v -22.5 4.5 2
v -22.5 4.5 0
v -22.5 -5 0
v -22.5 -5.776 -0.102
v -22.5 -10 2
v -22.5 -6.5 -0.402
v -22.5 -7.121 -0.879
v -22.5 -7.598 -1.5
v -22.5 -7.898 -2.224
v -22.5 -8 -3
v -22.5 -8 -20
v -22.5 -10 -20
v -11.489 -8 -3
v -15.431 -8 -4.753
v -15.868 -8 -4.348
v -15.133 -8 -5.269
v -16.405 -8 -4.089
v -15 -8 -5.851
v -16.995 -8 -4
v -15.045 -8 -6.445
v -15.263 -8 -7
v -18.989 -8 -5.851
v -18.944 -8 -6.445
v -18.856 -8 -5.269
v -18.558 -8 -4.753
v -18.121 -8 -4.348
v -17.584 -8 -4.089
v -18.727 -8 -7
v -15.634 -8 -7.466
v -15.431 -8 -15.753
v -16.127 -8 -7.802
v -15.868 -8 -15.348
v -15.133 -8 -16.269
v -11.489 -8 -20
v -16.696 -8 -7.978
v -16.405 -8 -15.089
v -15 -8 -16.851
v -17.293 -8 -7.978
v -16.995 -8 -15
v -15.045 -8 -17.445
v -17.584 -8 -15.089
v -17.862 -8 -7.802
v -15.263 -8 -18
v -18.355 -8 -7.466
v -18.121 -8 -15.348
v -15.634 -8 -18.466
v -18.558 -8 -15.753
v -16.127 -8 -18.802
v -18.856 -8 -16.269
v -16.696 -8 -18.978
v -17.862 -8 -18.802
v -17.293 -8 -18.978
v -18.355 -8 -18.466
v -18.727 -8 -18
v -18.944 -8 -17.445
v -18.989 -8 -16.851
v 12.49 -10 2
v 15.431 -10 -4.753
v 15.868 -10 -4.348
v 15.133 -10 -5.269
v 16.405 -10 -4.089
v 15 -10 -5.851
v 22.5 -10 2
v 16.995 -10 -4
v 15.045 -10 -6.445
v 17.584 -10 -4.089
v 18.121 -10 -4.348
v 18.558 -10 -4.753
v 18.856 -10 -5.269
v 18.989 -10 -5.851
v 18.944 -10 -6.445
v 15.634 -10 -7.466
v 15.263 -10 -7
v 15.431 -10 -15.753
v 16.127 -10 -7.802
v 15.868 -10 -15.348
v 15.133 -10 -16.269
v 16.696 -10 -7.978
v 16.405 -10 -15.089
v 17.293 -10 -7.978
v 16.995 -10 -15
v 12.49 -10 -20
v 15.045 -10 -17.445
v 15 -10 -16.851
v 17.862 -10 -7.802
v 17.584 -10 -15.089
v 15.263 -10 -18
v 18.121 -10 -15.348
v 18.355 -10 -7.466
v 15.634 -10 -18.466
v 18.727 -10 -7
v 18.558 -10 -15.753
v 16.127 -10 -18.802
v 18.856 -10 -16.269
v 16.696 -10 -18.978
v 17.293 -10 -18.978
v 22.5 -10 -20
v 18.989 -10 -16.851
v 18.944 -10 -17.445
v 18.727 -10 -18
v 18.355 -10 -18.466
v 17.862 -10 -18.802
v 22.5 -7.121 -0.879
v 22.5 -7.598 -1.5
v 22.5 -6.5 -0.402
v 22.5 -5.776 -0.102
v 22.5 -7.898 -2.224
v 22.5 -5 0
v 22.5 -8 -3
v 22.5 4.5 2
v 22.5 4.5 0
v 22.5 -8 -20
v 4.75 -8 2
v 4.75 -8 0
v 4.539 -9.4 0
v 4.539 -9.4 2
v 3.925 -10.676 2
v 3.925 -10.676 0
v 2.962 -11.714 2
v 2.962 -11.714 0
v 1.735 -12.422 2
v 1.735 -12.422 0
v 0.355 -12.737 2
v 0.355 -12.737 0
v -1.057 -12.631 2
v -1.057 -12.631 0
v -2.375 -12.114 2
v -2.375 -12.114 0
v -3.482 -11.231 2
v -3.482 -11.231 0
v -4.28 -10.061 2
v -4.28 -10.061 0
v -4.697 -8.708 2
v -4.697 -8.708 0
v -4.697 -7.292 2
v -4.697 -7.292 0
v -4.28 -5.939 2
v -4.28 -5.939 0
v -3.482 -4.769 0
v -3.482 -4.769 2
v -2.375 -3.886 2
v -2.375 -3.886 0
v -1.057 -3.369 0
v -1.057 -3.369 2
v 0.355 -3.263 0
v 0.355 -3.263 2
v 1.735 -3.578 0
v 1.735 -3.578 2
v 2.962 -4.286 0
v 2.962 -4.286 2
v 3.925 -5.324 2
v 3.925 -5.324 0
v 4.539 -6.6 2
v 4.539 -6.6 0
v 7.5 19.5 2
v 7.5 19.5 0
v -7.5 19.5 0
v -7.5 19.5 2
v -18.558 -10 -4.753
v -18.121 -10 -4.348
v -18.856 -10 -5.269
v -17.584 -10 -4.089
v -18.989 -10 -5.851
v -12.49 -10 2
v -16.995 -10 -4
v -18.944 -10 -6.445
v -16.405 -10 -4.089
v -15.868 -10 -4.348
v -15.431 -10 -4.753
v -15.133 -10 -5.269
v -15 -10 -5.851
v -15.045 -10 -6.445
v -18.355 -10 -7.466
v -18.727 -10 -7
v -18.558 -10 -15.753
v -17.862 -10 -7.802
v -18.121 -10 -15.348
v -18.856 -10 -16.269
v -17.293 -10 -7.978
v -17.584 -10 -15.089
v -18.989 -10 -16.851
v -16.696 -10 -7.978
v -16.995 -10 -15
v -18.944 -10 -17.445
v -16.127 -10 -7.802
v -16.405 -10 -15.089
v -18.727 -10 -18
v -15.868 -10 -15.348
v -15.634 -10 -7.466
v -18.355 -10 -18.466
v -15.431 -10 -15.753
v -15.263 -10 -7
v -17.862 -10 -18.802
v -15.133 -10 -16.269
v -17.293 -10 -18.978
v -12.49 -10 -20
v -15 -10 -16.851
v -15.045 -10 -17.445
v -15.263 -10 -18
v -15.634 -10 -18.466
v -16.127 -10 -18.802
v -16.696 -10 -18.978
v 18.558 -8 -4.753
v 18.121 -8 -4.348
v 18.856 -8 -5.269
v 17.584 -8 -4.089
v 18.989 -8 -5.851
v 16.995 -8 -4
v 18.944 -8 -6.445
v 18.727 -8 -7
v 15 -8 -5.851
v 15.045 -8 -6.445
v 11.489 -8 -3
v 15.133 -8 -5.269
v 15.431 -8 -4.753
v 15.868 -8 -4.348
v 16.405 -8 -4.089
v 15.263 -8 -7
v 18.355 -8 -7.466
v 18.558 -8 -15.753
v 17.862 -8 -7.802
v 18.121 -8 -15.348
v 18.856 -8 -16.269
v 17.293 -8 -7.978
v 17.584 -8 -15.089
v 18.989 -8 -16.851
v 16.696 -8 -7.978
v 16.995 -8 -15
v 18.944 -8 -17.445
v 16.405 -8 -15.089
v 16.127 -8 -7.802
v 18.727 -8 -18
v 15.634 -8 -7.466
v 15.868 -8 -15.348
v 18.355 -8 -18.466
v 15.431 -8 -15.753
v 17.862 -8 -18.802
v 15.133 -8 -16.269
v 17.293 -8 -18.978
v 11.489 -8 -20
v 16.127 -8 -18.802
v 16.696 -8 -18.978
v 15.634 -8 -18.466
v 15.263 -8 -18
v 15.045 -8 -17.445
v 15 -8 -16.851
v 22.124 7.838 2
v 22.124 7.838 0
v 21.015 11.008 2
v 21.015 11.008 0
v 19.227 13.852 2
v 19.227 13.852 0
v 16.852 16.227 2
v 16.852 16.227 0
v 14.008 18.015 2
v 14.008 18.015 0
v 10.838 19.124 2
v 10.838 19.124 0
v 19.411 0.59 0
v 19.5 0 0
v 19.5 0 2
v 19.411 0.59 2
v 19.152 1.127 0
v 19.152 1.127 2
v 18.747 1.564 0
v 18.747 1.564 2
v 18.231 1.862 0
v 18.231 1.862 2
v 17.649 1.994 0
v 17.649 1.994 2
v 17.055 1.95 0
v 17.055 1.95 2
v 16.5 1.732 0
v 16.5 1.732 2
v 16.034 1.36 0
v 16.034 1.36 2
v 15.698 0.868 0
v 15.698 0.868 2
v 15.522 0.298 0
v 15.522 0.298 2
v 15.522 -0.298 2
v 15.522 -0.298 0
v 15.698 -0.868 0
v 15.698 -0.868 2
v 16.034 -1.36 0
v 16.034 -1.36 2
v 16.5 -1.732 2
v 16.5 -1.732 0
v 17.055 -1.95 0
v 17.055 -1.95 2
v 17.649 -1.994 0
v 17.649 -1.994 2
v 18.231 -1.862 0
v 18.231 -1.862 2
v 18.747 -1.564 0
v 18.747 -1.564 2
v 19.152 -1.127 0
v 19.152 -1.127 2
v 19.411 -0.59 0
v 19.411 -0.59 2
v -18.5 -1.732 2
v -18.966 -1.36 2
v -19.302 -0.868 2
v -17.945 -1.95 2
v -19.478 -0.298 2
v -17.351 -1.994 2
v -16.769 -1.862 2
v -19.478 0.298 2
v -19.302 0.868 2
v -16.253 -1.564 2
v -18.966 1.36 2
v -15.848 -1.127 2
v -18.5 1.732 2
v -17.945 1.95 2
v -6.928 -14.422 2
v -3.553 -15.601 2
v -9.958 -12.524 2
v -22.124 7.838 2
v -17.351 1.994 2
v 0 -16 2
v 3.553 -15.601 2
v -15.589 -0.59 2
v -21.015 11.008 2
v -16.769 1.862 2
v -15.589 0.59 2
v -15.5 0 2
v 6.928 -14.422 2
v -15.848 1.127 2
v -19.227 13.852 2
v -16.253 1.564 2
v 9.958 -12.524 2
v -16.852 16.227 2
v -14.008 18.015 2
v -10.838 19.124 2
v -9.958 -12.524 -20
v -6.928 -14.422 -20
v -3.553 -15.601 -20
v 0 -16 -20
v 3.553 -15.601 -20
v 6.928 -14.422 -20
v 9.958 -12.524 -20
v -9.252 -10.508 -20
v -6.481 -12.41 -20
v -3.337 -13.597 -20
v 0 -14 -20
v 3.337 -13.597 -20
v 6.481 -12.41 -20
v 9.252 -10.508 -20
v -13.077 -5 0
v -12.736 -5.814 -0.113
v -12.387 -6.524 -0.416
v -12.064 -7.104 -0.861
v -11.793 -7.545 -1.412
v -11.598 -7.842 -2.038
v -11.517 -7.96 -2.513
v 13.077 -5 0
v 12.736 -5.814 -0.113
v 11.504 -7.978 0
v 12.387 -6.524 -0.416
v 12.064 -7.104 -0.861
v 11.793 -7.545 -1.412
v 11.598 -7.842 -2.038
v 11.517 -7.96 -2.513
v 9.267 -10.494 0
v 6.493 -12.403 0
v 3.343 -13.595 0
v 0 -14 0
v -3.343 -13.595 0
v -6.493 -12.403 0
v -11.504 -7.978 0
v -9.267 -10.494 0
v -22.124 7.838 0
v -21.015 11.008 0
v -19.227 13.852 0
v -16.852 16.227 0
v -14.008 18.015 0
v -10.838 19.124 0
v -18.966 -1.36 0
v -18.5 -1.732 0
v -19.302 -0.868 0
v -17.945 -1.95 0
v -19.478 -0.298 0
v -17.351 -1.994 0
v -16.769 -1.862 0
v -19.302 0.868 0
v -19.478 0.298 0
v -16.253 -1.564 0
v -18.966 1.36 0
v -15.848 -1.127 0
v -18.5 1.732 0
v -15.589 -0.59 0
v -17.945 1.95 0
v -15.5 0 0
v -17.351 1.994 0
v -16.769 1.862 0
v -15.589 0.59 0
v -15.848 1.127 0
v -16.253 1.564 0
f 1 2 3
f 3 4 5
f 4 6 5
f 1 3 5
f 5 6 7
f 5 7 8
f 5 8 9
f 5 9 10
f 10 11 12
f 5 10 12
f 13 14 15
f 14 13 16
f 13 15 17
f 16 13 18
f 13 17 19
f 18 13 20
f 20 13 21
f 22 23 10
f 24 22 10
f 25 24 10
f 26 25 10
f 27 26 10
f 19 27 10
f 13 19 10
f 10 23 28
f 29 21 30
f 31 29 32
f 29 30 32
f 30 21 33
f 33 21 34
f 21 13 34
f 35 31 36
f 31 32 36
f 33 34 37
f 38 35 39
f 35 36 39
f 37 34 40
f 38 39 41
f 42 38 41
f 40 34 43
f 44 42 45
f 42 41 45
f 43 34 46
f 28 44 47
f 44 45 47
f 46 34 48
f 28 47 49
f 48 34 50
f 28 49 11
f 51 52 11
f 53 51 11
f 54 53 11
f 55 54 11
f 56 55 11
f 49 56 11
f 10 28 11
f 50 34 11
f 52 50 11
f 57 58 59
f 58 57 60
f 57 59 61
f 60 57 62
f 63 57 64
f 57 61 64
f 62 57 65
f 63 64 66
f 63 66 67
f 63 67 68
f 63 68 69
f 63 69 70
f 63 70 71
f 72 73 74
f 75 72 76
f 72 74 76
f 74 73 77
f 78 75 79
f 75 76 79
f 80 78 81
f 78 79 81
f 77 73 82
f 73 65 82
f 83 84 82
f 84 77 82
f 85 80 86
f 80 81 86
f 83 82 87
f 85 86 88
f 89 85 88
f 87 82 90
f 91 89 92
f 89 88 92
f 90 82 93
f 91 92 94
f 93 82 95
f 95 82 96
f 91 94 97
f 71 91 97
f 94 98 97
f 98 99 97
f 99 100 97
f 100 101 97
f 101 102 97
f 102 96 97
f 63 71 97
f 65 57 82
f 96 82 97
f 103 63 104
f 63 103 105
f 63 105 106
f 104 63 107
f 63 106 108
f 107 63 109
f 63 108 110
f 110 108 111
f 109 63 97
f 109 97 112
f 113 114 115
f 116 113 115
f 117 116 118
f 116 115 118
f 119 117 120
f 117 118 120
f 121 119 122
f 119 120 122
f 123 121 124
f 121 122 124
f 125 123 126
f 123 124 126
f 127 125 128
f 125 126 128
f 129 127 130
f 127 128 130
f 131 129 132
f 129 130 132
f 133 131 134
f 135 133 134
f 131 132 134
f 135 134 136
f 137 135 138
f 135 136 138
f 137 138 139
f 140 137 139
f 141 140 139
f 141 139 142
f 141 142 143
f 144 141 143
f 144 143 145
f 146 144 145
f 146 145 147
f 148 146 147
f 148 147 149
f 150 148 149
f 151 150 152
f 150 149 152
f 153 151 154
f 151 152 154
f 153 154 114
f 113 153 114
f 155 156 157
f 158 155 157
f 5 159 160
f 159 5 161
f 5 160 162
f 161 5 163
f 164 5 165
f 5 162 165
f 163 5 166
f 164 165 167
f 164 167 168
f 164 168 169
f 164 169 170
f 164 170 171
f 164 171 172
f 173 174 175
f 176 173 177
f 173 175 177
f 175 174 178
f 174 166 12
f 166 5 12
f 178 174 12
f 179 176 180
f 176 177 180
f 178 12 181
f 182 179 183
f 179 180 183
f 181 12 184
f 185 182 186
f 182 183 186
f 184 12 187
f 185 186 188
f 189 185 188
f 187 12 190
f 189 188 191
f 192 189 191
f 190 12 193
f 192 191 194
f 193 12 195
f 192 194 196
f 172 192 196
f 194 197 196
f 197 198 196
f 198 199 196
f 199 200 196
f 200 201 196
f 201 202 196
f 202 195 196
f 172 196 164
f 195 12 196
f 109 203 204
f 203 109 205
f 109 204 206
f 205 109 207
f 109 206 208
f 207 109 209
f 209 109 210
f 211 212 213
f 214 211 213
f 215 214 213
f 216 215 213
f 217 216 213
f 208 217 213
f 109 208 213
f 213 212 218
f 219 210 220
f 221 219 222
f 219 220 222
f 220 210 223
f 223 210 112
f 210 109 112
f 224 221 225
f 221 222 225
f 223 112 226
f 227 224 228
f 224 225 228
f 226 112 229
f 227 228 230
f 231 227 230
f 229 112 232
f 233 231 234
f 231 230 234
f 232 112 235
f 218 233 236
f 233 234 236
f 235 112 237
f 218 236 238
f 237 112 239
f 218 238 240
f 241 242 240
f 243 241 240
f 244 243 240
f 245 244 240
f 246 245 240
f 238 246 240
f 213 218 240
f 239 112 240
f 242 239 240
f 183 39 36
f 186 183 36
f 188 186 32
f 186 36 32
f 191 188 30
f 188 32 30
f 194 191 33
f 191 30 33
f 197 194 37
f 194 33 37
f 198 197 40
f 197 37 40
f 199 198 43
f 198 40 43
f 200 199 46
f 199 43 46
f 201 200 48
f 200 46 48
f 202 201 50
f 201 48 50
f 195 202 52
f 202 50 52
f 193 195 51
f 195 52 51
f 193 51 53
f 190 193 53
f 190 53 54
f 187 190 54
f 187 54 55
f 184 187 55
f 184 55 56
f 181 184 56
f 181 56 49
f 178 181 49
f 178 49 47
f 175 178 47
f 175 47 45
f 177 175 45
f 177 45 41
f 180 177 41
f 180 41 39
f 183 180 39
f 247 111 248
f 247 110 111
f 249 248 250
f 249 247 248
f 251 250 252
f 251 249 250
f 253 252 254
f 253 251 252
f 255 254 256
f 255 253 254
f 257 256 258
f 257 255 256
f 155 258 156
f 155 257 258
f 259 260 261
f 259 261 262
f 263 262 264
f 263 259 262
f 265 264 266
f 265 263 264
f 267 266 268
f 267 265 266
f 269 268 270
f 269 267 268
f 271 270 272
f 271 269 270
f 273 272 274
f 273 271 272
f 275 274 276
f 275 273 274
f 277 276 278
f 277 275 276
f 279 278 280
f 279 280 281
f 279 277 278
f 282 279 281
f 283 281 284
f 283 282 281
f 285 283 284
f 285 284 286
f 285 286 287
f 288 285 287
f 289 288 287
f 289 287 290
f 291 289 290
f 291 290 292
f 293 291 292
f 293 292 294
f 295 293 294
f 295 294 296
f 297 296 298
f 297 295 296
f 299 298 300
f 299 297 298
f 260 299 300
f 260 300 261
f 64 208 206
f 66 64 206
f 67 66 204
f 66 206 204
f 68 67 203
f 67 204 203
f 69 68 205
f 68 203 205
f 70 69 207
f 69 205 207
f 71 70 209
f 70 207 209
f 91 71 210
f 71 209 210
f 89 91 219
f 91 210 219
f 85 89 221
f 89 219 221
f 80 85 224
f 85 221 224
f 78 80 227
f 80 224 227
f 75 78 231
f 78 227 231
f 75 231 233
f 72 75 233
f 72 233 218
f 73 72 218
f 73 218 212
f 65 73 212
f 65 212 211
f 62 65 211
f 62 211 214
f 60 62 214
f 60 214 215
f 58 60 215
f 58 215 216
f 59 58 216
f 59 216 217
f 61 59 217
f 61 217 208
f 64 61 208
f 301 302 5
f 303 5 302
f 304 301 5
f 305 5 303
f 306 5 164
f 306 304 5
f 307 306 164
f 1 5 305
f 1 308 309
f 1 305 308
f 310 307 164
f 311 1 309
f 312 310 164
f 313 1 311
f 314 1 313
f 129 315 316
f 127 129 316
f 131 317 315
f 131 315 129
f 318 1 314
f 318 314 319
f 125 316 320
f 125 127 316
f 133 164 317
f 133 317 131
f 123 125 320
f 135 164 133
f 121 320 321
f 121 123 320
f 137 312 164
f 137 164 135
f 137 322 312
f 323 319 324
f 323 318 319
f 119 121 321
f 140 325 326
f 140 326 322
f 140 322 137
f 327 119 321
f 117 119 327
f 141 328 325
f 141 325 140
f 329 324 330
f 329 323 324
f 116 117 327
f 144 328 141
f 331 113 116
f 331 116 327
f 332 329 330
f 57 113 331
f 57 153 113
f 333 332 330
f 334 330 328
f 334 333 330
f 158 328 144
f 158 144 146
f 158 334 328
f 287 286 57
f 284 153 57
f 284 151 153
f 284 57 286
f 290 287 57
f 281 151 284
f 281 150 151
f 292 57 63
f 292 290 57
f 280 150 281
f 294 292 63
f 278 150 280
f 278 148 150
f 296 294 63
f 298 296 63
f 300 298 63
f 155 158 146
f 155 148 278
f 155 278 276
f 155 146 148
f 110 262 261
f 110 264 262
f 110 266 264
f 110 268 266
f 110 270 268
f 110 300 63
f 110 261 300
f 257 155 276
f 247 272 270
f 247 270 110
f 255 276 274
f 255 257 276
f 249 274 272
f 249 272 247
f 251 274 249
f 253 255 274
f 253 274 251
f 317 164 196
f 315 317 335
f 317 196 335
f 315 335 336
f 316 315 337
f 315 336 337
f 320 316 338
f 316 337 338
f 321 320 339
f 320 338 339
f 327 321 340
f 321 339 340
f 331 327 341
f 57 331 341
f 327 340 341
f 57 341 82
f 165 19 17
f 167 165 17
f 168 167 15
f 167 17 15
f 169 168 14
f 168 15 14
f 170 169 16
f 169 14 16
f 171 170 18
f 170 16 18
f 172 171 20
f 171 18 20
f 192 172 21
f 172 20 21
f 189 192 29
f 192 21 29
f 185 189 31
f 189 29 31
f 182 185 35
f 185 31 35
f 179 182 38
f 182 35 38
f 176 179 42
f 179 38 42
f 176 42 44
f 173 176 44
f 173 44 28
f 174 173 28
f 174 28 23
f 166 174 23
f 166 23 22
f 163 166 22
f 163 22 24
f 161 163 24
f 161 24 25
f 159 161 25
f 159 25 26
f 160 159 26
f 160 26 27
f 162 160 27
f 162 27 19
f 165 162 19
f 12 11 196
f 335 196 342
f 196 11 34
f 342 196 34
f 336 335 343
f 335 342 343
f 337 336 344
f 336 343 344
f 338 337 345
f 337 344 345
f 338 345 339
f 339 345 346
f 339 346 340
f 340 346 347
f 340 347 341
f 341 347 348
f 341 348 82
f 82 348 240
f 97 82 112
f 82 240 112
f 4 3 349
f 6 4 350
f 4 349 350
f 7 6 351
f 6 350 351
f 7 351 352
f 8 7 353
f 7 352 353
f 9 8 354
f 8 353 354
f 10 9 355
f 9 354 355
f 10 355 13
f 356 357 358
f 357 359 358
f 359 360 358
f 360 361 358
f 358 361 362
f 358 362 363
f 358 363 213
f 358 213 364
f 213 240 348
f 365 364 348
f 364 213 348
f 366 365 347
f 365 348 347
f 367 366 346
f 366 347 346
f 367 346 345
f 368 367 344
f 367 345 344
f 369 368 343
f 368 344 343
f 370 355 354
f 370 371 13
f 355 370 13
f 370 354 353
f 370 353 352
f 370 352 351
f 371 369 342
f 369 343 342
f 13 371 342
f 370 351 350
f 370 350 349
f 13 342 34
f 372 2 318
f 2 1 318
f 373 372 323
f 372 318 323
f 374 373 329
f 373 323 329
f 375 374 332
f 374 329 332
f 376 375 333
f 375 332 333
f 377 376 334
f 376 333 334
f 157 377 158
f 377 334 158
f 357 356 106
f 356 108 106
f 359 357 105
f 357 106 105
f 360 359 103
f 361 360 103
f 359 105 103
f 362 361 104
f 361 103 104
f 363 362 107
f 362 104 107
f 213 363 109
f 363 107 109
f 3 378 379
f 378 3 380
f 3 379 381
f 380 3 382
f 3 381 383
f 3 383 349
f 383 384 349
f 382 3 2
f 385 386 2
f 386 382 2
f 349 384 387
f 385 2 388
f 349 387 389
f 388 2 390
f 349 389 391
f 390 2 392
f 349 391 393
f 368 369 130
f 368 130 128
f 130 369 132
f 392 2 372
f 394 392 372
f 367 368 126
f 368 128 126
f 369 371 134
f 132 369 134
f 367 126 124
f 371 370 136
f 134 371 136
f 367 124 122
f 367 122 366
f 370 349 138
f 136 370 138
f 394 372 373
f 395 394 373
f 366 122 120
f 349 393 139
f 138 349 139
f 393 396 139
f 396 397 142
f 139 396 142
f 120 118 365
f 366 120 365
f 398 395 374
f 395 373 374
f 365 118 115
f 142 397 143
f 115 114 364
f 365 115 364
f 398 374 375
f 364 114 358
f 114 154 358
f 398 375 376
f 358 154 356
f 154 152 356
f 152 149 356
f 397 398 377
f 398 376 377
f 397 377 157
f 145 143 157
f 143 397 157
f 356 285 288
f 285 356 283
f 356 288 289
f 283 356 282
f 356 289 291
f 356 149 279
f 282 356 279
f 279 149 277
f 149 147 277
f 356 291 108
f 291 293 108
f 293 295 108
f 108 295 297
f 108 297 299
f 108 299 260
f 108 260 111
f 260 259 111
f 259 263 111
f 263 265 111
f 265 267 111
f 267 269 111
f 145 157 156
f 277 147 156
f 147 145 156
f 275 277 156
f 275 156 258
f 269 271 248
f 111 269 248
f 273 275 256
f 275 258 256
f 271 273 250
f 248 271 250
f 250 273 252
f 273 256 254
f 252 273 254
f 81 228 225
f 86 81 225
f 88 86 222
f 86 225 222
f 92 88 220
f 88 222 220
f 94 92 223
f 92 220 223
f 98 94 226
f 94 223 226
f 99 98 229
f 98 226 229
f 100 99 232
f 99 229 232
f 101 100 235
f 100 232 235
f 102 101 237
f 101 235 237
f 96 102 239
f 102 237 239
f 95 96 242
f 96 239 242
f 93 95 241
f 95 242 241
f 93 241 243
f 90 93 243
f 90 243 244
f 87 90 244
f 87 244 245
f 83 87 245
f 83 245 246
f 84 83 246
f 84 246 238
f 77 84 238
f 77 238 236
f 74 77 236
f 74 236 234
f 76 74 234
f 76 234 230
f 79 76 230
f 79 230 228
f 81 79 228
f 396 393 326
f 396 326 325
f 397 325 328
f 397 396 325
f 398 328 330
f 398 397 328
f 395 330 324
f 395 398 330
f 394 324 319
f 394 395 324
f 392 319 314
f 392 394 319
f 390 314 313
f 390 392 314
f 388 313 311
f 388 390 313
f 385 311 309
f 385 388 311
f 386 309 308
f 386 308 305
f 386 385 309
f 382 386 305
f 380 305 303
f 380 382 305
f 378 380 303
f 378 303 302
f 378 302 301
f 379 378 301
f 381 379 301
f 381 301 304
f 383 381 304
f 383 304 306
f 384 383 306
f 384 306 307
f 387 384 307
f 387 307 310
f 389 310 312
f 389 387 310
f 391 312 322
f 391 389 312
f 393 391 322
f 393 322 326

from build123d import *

# Parameters (mm, degrees)
SKETCH1_R           = 2
BOSS_EXTRUDE2_DEPTH = 2
BOSS_EXTRUDE3_START = -22
BOSS_EXTRUDE3_DEPTH = 22
FILLET1_R           = 15
FILLET2_R           = 3
SKETCH3_R           = 2
CUT_EXTRUDE1_DEPTH  = 21


with BuildPart() as part:
    # Sketch1 → Boss-Extrude2 (new body)
    # profile 1 of 5: a face of its own
    with BuildSketch(Plane.XY):
        with BuildLine():
            Line((-22.5, 19.5), (-22.5, -8))
            Line((-22.5, -8), (-11.489125293, -8))
            ThreePointArc((-11.489125293, -8), (-4.192388692, 13.357540082), (14, 0))
            ThreePointArc((14, 0), (13.357540082, -4.192388692), (11.489125293, -8))
            Line((11.489125293, -8), (22.5, -8))
            Line((22.5, -8), (22.5, 19.5))
            Line((22.5, 19.5), (-22.5, 19.5))
        make_face()
        with Locations((-17.5, 0)):
            Circle(SKETCH1_R, mode=Mode.SUBTRACT)
        with Locations((17.5, 0)):
            Circle(SKETCH1_R, mode=Mode.SUBTRACT)
    # profile 2 of 5: a face of its own
    with BuildSketch(Plane.XY):
        with BuildLine():
            ThreePointArc((14, 0), (-4.192388692, 13.357540082), (-11.489125293, -8))
            Line((-11.489125293, -8), (-4.75, -8))
            ThreePointArc((-4.75, -8), (0, -3.25), (4.75, -8))
            Line((4.75, -8), (11.489125293, -8))
            ThreePointArc((11.489125293, -8), (13.357540082, -4.192388692), (14, 0))
        make_face()
    # profile 3 of 5: a face of its own
    with BuildSketch(Plane.XY):
        with BuildLine():
            Line((-4.75, -8), (-11.489125293, -8))
            ThreePointArc((-11.489125293, -8), (0, -14), (11.489125293, -8))
            Line((11.489125293, -8), (4.75, -8))
            ThreePointArc((4.75, -8), (0, -12.75), (-4.75, -8))
        make_face()
    # profile 4 of 5: a face of its own
    with BuildSketch(Plane.XY):
        with BuildLine():
            ThreePointArc((14, 0), (-4.192388692, 13.357540082), (-11.489125293, -8))
            Line((-11.489125293, -8), (-4.75, -8))
            ThreePointArc((-4.75, -8), (0, -3.25), (4.75, -8))
            Line((4.75, -8), (11.489125293, -8))
            ThreePointArc((11.489125293, -8), (13.357540082, -4.192388692), (14, 0))
        make_face()
    # profile 5 of 5: a face of its own
    with BuildSketch(Plane.XY):
        with BuildLine():
            Line((-4.75, -8), (-11.489125293, -8))
            ThreePointArc((-11.489125293, -8), (0, -14), (11.489125293, -8))
            Line((11.489125293, -8), (4.75, -8))
            ThreePointArc((4.75, -8), (0, -12.75), (-4.75, -8))
        make_face()
    extrude(amount=BOSS_EXTRUDE2_DEPTH)

    # Sketch2 → Boss-Extrude3 (add)
    with BuildSketch(Plane.XY.offset(2).offset(BOSS_EXTRUDE3_START)):
        with BuildLine():
            Line((-22.5, -8), (-22.5, -10))
            Line((-22.5, -10), (-12.489995997, -10))
            ThreePointArc((-12.489995997, -10), (0, -16), (12.489995997, -10))
            Line((12.489995997, -10), (22.5, -10))
            Line((22.5, -10), (22.5, -8))
            Line((22.5, -8), (11.489125293, -8))
            ThreePointArc((11.489125293, -8), (0, -14), (-11.489125293, -8))
            Line((-11.489125293, -8), (-22.5, -8))
        make_face()
    extrude(amount=BOSS_EXTRUDE3_DEPTH)

    # Fillet1
    fillet1_edges = [part.edges().sort_by_distance(p)[0] for p in [
        (-22.5, 19.5, 1),
        (22.5, 19.5, 1),
    ]]
    fillet(fillet1_edges, radius=FILLET1_R)

    # Fillet2
    fillet2_edges = [part.edges().sort_by_distance(p)[0] for p in [
        (-16.994562647, -8, 0),
        (16.994562647, -8, 0),
    ]]
    fillet(fillet2_edges, radius=FILLET2_R)

    # Sketch3 → Cut-Extrude1 (cut)
    with BuildSketch(Plane(origin=(0, -8, 0), x_dir=(1, 0, 0), z_dir=(0, 1, 0))):
        with Locations(Location((-16.994562647, 6, 0), (0, 0, 270))):
            Circle(SKETCH3_R)
        with Locations(Location((-16.994562647, 17, 0), (0, 0, 270))):
            Circle(SKETCH3_R)
        with Locations(Location((16.994562647, 17, 0), (0, 0, 270))):
            Circle(SKETCH3_R)
        with Locations(Location((16.994562647, 6, 0), (0, 0, 270))):
            Circle(SKETCH3_R)
    extrude(amount=-CUT_EXTRUDE1_DEPTH, mode=Mode.SUBTRACT)


solid = part.part
